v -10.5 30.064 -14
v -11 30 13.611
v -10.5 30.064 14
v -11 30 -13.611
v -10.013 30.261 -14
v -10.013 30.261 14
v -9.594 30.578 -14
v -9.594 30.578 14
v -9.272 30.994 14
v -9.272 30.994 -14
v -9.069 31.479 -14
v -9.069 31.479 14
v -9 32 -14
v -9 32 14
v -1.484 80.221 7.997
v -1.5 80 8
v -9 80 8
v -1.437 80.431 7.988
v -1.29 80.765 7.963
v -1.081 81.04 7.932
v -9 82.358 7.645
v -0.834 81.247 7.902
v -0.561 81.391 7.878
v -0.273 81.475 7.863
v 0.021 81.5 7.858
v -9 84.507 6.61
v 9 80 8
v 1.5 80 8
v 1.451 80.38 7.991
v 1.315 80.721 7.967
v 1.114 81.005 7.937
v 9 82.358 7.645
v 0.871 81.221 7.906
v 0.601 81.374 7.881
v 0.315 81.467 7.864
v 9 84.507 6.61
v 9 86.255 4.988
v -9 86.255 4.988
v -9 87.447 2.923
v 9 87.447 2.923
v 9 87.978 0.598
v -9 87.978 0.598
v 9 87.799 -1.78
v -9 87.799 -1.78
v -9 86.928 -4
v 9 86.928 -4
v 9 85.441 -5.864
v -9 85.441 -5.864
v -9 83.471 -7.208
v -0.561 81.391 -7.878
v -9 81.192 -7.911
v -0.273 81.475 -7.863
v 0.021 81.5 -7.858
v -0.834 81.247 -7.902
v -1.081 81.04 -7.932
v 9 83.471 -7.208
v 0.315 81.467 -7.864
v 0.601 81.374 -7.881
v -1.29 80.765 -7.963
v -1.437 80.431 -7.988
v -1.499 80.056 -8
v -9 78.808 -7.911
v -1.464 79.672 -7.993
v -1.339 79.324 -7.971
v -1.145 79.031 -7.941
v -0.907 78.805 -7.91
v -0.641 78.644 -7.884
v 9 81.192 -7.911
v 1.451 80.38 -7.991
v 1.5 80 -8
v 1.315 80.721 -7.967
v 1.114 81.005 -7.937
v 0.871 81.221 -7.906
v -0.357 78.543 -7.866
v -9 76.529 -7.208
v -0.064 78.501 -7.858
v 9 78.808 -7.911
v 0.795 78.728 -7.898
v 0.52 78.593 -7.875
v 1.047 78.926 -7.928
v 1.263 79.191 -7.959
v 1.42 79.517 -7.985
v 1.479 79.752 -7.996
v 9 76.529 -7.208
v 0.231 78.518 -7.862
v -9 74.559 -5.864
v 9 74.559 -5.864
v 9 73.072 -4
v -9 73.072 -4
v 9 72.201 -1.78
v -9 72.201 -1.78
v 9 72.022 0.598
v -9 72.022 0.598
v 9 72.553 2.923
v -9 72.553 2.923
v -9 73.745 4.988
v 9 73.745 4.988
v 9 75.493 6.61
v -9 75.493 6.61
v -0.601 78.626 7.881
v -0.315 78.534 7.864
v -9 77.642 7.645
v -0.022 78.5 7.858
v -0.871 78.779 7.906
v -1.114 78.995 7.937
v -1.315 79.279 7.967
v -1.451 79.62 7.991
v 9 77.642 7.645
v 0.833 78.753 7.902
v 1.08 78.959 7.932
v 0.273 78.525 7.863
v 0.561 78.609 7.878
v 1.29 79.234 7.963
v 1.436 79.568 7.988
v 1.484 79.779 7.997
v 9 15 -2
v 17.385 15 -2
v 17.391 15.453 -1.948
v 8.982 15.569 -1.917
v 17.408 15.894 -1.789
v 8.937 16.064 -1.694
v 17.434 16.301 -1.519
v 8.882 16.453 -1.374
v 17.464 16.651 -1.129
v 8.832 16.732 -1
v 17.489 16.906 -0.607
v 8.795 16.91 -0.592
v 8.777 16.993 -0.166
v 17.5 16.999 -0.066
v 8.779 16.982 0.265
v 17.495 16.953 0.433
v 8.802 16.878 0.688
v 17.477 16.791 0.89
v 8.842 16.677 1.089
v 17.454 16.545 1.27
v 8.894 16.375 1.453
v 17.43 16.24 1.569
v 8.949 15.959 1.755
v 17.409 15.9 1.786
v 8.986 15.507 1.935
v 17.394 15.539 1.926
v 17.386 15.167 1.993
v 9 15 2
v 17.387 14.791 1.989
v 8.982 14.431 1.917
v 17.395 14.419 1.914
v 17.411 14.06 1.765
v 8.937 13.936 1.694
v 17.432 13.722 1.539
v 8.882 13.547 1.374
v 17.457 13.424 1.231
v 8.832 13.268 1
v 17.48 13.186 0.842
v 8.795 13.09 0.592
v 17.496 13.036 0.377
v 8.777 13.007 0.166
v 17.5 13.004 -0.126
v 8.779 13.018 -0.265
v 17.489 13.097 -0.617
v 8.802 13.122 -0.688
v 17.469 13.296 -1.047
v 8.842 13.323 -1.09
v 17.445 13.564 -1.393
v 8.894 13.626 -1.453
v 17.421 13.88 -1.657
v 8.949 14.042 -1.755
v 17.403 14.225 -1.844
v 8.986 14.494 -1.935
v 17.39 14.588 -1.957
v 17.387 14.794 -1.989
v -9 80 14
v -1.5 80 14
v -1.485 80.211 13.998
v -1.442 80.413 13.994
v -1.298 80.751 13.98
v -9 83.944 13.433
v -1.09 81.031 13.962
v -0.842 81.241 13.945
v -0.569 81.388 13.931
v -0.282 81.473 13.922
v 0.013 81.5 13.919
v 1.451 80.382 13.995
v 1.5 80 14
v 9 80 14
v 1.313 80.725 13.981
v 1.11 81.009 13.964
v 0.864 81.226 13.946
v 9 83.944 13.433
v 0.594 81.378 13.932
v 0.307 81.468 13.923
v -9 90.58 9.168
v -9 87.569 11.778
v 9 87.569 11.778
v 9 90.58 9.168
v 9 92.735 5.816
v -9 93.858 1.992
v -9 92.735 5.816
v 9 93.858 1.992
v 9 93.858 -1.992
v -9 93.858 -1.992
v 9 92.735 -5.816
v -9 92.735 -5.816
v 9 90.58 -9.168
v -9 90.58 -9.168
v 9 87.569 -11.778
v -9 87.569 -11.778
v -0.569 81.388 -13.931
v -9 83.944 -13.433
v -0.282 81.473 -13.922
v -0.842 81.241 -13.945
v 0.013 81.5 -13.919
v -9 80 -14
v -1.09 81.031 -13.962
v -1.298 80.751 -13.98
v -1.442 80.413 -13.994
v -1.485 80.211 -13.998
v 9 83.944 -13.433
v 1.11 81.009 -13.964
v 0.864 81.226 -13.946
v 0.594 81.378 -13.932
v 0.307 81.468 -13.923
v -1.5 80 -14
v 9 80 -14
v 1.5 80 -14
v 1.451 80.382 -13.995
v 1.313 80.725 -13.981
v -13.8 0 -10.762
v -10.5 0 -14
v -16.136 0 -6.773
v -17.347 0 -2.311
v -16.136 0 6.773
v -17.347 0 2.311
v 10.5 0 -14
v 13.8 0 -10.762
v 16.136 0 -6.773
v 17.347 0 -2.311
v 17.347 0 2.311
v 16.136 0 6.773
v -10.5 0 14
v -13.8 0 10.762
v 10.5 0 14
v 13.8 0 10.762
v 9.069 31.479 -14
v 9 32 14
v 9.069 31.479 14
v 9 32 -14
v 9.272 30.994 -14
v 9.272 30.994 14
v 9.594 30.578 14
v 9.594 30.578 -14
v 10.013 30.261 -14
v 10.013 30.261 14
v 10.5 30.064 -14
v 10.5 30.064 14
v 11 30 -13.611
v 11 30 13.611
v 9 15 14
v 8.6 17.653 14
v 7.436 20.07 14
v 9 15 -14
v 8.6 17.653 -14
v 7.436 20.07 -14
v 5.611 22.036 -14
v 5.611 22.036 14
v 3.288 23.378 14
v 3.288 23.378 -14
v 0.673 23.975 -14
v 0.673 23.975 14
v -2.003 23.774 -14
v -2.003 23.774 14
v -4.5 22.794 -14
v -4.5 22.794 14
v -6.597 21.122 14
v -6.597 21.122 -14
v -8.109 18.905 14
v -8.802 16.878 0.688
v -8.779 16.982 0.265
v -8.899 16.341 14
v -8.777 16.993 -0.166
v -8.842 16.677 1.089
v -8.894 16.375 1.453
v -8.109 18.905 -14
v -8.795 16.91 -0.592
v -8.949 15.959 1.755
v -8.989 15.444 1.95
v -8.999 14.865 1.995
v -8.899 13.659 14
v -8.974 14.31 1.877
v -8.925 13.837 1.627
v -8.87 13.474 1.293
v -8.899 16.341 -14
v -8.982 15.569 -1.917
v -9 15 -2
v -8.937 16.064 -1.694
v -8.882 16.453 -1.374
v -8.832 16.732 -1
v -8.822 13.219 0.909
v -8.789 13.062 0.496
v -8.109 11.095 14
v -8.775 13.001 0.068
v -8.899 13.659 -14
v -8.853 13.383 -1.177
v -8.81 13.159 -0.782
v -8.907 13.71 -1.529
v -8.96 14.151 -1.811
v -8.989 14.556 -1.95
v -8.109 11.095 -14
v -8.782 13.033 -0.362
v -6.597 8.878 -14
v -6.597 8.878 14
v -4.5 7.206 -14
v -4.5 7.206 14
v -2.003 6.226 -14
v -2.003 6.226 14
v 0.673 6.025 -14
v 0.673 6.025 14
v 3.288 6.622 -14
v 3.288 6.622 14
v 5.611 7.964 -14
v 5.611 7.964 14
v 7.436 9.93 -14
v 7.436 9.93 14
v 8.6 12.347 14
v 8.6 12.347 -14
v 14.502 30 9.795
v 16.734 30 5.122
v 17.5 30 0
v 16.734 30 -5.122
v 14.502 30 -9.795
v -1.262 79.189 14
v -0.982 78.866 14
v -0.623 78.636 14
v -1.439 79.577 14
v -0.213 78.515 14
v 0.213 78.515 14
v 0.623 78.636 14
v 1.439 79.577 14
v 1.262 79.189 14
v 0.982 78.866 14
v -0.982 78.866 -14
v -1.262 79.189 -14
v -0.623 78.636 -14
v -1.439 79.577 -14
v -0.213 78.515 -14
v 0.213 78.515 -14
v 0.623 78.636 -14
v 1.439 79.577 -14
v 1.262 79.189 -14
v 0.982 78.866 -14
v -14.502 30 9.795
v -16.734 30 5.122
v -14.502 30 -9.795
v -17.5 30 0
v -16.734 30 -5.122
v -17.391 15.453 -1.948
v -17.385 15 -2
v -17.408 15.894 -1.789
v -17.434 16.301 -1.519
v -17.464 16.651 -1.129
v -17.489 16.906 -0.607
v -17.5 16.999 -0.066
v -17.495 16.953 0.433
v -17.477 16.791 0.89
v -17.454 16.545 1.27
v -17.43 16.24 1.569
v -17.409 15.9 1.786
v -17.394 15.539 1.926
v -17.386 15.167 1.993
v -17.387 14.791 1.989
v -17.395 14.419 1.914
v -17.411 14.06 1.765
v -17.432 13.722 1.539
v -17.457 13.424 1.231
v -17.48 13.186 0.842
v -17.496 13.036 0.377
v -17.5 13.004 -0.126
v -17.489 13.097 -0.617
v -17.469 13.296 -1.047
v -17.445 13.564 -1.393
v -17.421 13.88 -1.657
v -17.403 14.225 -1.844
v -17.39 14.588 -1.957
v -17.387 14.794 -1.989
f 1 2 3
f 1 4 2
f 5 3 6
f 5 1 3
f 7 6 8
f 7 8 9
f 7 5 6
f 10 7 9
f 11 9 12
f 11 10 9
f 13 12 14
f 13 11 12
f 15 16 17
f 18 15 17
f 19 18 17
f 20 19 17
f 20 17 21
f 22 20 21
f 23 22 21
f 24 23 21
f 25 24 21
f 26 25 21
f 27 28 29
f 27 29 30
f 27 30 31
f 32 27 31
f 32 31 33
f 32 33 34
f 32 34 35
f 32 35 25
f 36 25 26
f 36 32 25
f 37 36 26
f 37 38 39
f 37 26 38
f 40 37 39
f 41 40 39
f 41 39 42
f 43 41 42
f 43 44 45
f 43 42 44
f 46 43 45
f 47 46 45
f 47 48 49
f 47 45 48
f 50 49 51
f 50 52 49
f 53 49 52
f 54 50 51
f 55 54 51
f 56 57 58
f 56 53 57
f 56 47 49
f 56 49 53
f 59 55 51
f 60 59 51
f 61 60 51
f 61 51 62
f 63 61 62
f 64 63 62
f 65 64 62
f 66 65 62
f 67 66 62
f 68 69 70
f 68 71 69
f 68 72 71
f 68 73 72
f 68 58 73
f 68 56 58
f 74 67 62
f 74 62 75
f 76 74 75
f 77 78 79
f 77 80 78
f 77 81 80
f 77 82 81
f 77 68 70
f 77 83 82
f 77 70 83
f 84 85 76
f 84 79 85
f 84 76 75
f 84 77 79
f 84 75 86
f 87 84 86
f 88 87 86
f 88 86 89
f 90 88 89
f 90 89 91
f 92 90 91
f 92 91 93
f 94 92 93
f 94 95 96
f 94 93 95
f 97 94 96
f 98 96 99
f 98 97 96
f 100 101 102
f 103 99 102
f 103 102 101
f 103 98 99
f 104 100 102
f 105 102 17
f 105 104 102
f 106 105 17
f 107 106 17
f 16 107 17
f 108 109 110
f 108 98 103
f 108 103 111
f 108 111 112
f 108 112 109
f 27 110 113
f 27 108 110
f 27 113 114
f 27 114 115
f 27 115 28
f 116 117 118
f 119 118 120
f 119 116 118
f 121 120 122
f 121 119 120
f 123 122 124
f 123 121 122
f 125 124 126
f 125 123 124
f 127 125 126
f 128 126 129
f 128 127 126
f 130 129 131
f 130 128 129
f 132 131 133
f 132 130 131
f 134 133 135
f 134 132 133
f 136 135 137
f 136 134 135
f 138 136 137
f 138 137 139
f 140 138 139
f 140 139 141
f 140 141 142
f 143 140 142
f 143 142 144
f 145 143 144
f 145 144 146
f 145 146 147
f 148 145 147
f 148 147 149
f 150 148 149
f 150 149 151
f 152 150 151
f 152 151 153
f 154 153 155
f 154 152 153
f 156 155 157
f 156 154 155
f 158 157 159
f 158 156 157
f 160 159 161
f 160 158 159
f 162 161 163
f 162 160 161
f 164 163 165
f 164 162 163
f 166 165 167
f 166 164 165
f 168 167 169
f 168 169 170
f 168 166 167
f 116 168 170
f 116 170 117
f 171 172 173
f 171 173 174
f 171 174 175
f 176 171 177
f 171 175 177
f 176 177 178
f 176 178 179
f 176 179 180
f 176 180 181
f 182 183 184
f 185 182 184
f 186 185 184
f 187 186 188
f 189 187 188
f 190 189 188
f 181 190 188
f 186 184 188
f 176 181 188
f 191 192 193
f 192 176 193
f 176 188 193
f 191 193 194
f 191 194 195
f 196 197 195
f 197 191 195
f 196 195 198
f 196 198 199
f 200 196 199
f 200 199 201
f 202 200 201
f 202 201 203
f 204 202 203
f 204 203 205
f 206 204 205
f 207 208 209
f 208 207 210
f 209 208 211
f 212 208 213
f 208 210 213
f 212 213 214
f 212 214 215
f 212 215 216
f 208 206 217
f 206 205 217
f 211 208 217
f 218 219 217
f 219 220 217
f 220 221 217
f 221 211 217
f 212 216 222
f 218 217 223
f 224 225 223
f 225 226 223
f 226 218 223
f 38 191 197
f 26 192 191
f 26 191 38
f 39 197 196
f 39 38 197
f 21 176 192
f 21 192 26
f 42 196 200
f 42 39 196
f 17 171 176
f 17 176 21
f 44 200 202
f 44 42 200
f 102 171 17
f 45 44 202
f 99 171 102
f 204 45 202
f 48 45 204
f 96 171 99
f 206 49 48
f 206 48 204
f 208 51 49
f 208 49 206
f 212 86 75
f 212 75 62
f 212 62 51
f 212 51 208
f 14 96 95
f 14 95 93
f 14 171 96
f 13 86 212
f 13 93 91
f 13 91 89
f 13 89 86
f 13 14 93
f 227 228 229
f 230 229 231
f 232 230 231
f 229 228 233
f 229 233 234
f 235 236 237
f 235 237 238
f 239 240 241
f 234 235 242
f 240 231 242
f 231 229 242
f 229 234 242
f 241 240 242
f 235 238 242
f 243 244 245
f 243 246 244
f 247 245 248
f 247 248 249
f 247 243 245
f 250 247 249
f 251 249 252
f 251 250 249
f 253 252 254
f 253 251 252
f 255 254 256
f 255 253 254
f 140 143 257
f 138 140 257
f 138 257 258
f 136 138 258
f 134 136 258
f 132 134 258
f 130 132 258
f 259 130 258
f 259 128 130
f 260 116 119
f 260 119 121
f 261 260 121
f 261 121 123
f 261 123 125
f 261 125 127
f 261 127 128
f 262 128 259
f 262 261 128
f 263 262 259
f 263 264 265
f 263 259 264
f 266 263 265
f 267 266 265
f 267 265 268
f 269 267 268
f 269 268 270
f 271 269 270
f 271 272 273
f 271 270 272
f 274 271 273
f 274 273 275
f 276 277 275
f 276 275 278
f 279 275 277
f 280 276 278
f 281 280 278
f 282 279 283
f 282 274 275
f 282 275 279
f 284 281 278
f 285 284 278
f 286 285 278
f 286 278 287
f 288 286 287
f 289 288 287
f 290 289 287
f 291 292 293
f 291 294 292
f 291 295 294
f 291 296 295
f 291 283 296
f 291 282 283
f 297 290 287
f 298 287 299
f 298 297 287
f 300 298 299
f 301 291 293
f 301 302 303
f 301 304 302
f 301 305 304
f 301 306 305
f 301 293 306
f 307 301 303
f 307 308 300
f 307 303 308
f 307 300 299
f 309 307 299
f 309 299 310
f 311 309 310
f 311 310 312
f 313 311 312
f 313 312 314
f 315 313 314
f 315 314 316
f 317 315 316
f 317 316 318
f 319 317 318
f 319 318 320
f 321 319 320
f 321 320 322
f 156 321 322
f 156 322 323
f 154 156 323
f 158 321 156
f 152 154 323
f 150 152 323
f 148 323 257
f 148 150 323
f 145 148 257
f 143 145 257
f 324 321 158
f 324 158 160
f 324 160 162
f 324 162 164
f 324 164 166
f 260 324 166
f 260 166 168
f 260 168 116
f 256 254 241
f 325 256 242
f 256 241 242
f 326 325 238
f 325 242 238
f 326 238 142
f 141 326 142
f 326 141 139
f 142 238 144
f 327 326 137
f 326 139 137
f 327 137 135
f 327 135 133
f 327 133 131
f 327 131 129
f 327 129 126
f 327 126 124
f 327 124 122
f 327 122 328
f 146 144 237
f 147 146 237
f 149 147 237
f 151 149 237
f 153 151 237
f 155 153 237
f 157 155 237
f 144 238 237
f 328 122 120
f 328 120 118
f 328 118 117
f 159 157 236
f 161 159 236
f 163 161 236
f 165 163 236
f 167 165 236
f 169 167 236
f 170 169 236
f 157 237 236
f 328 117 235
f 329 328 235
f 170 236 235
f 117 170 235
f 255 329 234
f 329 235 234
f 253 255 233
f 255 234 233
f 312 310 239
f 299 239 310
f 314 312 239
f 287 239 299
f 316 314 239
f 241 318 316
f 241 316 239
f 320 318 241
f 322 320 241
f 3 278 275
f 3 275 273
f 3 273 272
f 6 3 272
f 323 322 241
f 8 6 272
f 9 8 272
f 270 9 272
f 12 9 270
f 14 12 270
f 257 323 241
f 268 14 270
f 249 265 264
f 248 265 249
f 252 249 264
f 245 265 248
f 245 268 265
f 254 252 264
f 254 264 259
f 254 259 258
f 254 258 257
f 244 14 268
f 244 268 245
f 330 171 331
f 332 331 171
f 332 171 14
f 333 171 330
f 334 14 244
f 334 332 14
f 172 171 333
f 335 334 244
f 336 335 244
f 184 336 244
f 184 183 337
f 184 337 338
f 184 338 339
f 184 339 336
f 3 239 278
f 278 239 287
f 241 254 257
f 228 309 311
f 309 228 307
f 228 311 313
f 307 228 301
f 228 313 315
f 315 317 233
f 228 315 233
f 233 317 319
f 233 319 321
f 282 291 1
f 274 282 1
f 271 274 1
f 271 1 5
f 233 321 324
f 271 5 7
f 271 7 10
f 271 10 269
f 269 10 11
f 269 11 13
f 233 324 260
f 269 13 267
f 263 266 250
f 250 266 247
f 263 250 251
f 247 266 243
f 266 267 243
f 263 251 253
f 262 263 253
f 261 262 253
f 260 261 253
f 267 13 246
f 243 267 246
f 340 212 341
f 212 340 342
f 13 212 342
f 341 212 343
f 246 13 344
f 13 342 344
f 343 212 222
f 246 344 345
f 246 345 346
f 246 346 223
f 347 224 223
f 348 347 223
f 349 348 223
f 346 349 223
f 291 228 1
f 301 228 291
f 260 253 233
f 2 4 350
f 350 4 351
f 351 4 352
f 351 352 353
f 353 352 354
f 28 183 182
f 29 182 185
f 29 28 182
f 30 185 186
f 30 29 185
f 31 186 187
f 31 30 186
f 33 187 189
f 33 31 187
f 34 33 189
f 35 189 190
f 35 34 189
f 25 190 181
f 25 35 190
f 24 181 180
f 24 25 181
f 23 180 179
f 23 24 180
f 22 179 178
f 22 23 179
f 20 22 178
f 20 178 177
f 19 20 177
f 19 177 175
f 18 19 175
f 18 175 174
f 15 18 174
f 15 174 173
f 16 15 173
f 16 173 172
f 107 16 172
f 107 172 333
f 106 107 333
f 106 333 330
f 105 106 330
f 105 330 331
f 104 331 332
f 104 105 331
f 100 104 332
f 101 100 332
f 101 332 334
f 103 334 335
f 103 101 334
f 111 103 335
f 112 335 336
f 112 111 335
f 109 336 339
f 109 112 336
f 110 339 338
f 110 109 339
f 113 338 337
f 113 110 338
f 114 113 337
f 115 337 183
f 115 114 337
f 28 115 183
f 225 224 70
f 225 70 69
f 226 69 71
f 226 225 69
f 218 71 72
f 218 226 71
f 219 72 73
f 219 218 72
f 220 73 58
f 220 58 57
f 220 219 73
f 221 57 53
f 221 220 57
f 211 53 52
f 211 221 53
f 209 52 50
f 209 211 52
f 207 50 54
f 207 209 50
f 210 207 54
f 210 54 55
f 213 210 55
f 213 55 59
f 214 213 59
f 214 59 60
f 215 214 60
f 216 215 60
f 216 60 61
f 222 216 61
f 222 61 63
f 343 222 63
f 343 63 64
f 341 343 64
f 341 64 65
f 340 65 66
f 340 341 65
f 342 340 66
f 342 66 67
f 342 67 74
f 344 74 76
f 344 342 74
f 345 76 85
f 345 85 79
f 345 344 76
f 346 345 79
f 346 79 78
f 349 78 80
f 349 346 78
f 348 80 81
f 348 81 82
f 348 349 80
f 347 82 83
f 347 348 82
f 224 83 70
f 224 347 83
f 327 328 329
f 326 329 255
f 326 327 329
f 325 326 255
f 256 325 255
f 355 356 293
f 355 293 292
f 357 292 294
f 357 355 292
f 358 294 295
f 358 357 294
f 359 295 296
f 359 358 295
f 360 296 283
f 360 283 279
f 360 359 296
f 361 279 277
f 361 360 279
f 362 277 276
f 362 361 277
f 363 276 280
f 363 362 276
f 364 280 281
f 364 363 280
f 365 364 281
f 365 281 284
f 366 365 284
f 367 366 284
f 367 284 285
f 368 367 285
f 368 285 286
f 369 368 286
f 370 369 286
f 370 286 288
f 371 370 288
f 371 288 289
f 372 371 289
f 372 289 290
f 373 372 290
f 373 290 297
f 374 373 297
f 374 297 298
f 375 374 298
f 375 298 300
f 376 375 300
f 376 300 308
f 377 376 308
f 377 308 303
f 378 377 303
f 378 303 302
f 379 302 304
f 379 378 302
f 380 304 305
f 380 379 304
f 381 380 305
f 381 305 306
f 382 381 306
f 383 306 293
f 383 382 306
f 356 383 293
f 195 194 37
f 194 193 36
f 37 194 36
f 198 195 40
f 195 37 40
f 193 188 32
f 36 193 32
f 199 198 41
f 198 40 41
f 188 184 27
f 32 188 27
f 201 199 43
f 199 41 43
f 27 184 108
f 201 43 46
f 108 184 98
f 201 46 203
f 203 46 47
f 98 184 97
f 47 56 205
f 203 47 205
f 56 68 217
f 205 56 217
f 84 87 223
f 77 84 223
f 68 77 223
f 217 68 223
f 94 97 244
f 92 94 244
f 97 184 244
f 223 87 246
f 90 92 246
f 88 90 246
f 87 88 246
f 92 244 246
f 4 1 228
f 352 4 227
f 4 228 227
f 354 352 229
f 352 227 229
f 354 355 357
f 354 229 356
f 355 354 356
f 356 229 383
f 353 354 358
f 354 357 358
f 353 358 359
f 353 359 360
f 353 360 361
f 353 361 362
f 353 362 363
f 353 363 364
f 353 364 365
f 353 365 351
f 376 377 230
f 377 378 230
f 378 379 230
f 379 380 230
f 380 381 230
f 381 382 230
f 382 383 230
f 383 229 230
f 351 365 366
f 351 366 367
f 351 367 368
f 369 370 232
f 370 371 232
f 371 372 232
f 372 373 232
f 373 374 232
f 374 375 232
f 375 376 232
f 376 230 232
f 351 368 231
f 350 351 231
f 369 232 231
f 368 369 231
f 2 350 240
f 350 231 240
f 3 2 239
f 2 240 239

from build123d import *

# Parameters (mm, degrees)
SKETCH1_R               = 17.5
BOSS_EXTRUDE1_DEPTH     = 30
SKETCH2_W               = 18
SKETCH2_H               = 30.01666204
BOSS_EXTRUDE2_DEPTH     = 70
CUT_EXTRUDE1_DEPTH      = 104.01698889
CUT_EXTRUDE1_DEPTH_BACK = 104.01698889
CUT_EXTRUDE2_DEPTH      = 105.394683773
CUT_EXTRUDE2_DEPTH_BACK = 105.394683773
SKETCH4_R               = 8
CUT_EXTRUDE3_DEPTH      = 100.630567599
CUT_EXTRUDE3_DEPTH_BACK = 100.630567599
SKETCH6_R               = 9
FILLET1_R               = 2
CUT_EXTRUDE4_DEPTH      = 97.634621158
CUT_EXTRUDE4_DEPTH_BACK = 97.634621158
SKETCH7_R               = 2
CUT_EXTRUDE5_DEPTH      = 97.634621159
CUT_EXTRUDE5_DEPTH_BACK = 97.634621159
SKETCH8_R               = 1.5


with BuildPart() as part:
    # Sketch1 → Boss-Extrude1 (new body)
    with BuildSketch(Plane(origin=(0, 0, 0), x_dir=(1, 0, 0), z_dir=(0, 1, 0))):
        with Locations(Location((0, 0, 0), (0, 0, 270))):
            Circle(SKETCH1_R)
    extrude(amount=BOSS_EXTRUDE1_DEPTH)

    # Sketch2 → Boss-Extrude2 (add)
    with BuildSketch(Plane(origin=(0, 30, 0), x_dir=(1, 0, 0), z_dir=(0, 1, 0))):
        Rectangle(SKETCH2_W, SKETCH2_H)
    extrude(amount=BOSS_EXTRUDE2_DEPTH)

    # Sketch3 → Cut-Extrude1 (cut, two sides: drawn at the far end of the back side and taken through both)
    with BuildSketch(Plane.XZ.offset(-CUT_EXTRUDE1_DEPTH_BACK)):
        with BuildLine():
            Line((-10.5, -14), (10.5, -14))
            ThreePointArc((10.5, -14), (0, -17.5), (-10.5, -14))
        make_face()
        with BuildLine():
            Line((-10.5, 14), (10.5, 14))
            ThreePointArc((10.5, 14), (0, 17.5), (-10.5, 14))
        make_face()
    extrude(amount=CUT_EXTRUDE1_DEPTH + CUT_EXTRUDE1_DEPTH_BACK, mode=Mode.SUBTRACT)

    # Sketch4 → Cut-Extrude2 (cut, two sides: drawn at the far end of the back side and taken through both)
    with BuildSketch(Plane.ZY.offset(9).offset(-CUT_EXTRUDE2_DEPTH_BACK)):
        with Locations((0, 80)):
            Circle(SKETCH4_R)
        with BuildLine():
            Line((-14, 80), (-32.866525809, 80))
            Line((-32.866525809, 80), (-32.866525809, 110.116185887))
            Line((-32.866525809, 110.116185887), (25.904661095, 110.116185887))
            Line((25.904661095, 110.116185887), (25.904661095, 80))
            Line((25.904661095, 80), (14, 80))
            ThreePointArc((14, 80), (0, 94), (-14, 80))
        make_face()
    extrude(amount=CUT_EXTRUDE2_DEPTH + CUT_EXTRUDE2_DEPTH_BACK, mode=Mode.SUBTRACT)

    # Sketch6 → Cut-Extrude3 (cut, two sides: drawn at the far end of the back side and taken through both)
    with BuildSketch(Plane.XY.offset(-14).offset(-CUT_EXTRUDE3_DEPTH_BACK)):
        with Locations((0, 15)):
            Circle(SKETCH6_R)
    extrude(amount=CUT_EXTRUDE3_DEPTH + CUT_EXTRUDE3_DEPTH_BACK, mode=Mode.SUBTRACT)

    # Fillet1
    fillet1_edges = [part.edges().sort_by_distance(p)[0] for p in [
        (9, 30, 0),
        (-9, 30, 0),
    ]]
    fillet(fillet1_edges, radius=FILLET1_R)

    # Sketch7 → Cut-Extrude4 (cut, two sides: drawn at the far end of the back side and taken through both)
    with BuildSketch(Plane(origin=(0, 0, 0), x_dir=(0, 0, -1), z_dir=(1, 0, 0)).offset(-CUT_EXTRUDE4_DEPTH_BACK)):
        with Locations((0, 15)):
            Circle(SKETCH7_R)
    extrude(amount=CUT_EXTRUDE4_DEPTH + CUT_EXTRUDE4_DEPTH_BACK, mode=Mode.SUBTRACT)

    # Sketch8 → Cut-Extrude5 (cut, two sides: drawn at the far end of the back side and taken through both)
    with BuildSketch(Plane.XY.offset(-CUT_EXTRUDE5_DEPTH_BACK)):
        with Locations((0, 80)):
            Circle(SKETCH8_R)
    extrude(amount=CUT_EXTRUDE5_DEPTH + CUT_EXTRUDE5_DEPTH_BACK, mode=Mode.SUBTRACT)


solid = part.part
